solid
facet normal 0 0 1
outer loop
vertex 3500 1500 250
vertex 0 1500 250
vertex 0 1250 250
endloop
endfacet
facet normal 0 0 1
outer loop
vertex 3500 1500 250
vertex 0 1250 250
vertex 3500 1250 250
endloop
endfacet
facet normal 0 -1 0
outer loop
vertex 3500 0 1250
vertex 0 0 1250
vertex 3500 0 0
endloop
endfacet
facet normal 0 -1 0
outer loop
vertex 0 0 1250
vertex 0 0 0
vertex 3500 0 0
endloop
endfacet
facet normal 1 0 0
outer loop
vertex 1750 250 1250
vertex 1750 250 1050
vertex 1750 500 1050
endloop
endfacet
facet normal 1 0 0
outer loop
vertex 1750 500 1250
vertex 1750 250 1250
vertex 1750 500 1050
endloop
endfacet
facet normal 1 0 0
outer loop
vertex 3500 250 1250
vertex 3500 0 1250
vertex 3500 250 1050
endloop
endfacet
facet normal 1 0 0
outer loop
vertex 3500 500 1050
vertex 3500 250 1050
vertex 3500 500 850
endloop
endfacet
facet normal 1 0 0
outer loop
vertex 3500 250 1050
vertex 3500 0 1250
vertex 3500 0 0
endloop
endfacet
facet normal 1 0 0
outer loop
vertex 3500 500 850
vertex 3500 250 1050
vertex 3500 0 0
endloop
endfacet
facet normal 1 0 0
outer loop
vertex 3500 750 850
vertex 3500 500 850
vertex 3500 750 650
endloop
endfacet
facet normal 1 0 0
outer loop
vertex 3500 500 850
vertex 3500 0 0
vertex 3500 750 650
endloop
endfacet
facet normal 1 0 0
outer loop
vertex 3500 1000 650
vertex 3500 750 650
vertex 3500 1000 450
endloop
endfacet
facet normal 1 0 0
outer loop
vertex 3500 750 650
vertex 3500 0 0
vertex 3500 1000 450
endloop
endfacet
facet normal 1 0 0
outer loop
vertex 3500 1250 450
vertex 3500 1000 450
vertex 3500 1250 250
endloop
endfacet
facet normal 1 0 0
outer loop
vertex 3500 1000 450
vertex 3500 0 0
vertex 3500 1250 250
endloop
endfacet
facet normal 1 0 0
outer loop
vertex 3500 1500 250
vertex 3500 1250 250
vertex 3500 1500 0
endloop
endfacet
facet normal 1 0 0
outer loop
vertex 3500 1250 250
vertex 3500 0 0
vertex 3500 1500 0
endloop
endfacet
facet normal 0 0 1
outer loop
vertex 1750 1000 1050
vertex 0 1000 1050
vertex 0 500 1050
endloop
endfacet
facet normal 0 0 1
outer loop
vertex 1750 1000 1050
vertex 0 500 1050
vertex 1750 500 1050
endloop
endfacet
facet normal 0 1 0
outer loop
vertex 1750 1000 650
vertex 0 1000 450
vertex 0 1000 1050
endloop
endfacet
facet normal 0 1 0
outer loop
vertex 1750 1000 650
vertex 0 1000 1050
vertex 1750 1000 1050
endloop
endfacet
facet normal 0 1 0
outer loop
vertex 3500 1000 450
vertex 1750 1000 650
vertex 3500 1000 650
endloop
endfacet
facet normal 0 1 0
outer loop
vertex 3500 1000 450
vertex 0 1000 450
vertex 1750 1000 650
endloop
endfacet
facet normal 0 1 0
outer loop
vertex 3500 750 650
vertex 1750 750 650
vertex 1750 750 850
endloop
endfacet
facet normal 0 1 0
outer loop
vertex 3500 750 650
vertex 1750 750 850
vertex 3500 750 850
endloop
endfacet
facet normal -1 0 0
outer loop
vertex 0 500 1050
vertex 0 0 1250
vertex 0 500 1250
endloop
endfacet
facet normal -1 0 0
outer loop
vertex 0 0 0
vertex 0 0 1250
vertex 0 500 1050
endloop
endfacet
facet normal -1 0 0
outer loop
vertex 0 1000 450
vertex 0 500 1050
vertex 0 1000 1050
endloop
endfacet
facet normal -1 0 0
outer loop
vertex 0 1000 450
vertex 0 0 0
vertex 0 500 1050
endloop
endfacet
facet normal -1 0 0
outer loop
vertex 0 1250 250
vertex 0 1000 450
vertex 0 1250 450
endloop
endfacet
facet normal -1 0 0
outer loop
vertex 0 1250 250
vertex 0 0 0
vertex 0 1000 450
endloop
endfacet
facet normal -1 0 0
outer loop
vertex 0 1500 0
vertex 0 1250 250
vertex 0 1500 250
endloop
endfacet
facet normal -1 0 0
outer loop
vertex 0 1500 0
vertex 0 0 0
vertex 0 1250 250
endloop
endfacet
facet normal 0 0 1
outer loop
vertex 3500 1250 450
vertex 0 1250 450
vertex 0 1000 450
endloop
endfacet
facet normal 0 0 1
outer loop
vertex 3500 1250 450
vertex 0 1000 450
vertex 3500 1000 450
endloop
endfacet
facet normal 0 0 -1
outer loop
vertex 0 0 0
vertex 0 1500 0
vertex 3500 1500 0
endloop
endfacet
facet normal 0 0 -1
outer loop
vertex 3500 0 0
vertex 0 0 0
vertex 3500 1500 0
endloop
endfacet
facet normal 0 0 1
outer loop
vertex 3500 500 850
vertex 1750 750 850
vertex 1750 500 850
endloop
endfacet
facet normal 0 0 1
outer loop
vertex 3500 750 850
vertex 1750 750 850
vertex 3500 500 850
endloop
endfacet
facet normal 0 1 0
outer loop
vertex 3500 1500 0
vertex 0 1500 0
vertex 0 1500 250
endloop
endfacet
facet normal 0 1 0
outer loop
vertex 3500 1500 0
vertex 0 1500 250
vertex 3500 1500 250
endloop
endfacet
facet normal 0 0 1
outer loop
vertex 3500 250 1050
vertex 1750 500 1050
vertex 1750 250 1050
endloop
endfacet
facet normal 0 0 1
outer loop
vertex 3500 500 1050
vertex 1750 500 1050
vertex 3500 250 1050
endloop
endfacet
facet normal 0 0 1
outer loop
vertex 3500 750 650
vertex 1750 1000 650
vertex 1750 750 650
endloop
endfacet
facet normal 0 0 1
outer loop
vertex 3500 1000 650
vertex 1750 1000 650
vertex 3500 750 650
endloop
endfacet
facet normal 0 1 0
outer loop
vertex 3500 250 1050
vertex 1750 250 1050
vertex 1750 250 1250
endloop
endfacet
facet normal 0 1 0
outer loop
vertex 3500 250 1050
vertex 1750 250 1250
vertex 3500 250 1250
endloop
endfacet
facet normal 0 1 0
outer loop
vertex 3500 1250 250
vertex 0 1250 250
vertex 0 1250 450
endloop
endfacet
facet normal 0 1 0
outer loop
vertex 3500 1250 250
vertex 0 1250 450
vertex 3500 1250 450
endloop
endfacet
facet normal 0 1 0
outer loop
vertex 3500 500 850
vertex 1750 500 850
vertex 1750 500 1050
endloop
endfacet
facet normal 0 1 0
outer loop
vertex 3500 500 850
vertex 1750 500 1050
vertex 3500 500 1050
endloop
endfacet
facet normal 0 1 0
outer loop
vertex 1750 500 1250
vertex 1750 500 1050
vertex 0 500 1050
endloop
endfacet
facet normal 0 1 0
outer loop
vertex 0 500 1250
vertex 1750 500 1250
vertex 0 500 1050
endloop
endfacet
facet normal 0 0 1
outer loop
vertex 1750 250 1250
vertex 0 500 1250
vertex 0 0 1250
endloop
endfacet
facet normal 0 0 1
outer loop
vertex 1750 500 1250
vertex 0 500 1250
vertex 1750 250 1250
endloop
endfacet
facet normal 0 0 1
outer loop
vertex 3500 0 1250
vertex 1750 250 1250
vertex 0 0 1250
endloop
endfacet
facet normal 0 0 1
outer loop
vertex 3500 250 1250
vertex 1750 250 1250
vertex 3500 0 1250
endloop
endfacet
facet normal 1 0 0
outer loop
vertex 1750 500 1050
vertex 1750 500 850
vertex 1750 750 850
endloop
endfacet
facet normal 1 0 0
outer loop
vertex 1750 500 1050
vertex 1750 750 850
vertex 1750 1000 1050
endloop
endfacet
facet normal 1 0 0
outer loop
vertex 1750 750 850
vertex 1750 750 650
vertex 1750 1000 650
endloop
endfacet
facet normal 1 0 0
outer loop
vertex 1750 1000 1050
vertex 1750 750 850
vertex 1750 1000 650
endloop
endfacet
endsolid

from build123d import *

# Parameters (mm, degrees)
F0_W      = 3500
F0_H      = 1500
F1_DEPTH  = 250
F2_W      = 3500
F2_H      = 1250
F3_DEPTH  = 200
F4_W      = 1750
F4_H      = 250
F5_DEPTH  = 800
F6_W      = 1750
F6_H      = 500
F6_H_2    = 250
F7_DEPTH  = 600
F8_W      = 1750
F8_H      = 250
F9_DEPTH  = 400
F10_W     = 1750
F10_H     = 250
F11_DEPTH = 200


with BuildPart() as f1:
    # F0 (on Top) → F1 (new body)
    with BuildSketch(Plane.XY):
        with Locations((1750, 750)):
            Rectangle(F0_W, F0_H)
    extrude(amount=F1_DEPTH)

    # F2 (on face) → F3 (join)
    with BuildSketch(Plane.XY.offset(250)):
        with Locations((1750, 625)):
            Rectangle(F2_W, F2_H)
    extrude(amount=F3_DEPTH)

    # F4 (on face) → F5 (join)
    with BuildSketch(Plane.XY.offset(450)):
        Polygon((0, 500), (0, 0), (1750, 0), (1750, 250), (1750, 500), align=None)
        with Locations((2625, 125)):
            Rectangle(F4_W, F4_H)
    extrude(amount=F5_DEPTH)

    # F6 (on face) → F7 (join)
    with BuildSketch(Plane.XY.offset(450)):
        with Locations((875, 750)):
            Rectangle(F6_W, F6_H)
        with Locations((2625, 375)):
            Rectangle(F6_W, F6_H_2)
    extrude(amount=F7_DEPTH)

    # F8 (on face) → F9 (join)
    with BuildSketch(Plane.XY.offset(450)):
        with Locations((2625, 625)):
            Rectangle(F8_W, F8_H)
    extrude(amount=F9_DEPTH)

    # F10 (on face) → F11 (join)
    with BuildSketch(Plane.XY.offset(450)):
        with Locations((2625, 875)):
            Rectangle(F10_W, F10_H)
    extrude(amount=F11_DEPTH)


solid = f1.part
